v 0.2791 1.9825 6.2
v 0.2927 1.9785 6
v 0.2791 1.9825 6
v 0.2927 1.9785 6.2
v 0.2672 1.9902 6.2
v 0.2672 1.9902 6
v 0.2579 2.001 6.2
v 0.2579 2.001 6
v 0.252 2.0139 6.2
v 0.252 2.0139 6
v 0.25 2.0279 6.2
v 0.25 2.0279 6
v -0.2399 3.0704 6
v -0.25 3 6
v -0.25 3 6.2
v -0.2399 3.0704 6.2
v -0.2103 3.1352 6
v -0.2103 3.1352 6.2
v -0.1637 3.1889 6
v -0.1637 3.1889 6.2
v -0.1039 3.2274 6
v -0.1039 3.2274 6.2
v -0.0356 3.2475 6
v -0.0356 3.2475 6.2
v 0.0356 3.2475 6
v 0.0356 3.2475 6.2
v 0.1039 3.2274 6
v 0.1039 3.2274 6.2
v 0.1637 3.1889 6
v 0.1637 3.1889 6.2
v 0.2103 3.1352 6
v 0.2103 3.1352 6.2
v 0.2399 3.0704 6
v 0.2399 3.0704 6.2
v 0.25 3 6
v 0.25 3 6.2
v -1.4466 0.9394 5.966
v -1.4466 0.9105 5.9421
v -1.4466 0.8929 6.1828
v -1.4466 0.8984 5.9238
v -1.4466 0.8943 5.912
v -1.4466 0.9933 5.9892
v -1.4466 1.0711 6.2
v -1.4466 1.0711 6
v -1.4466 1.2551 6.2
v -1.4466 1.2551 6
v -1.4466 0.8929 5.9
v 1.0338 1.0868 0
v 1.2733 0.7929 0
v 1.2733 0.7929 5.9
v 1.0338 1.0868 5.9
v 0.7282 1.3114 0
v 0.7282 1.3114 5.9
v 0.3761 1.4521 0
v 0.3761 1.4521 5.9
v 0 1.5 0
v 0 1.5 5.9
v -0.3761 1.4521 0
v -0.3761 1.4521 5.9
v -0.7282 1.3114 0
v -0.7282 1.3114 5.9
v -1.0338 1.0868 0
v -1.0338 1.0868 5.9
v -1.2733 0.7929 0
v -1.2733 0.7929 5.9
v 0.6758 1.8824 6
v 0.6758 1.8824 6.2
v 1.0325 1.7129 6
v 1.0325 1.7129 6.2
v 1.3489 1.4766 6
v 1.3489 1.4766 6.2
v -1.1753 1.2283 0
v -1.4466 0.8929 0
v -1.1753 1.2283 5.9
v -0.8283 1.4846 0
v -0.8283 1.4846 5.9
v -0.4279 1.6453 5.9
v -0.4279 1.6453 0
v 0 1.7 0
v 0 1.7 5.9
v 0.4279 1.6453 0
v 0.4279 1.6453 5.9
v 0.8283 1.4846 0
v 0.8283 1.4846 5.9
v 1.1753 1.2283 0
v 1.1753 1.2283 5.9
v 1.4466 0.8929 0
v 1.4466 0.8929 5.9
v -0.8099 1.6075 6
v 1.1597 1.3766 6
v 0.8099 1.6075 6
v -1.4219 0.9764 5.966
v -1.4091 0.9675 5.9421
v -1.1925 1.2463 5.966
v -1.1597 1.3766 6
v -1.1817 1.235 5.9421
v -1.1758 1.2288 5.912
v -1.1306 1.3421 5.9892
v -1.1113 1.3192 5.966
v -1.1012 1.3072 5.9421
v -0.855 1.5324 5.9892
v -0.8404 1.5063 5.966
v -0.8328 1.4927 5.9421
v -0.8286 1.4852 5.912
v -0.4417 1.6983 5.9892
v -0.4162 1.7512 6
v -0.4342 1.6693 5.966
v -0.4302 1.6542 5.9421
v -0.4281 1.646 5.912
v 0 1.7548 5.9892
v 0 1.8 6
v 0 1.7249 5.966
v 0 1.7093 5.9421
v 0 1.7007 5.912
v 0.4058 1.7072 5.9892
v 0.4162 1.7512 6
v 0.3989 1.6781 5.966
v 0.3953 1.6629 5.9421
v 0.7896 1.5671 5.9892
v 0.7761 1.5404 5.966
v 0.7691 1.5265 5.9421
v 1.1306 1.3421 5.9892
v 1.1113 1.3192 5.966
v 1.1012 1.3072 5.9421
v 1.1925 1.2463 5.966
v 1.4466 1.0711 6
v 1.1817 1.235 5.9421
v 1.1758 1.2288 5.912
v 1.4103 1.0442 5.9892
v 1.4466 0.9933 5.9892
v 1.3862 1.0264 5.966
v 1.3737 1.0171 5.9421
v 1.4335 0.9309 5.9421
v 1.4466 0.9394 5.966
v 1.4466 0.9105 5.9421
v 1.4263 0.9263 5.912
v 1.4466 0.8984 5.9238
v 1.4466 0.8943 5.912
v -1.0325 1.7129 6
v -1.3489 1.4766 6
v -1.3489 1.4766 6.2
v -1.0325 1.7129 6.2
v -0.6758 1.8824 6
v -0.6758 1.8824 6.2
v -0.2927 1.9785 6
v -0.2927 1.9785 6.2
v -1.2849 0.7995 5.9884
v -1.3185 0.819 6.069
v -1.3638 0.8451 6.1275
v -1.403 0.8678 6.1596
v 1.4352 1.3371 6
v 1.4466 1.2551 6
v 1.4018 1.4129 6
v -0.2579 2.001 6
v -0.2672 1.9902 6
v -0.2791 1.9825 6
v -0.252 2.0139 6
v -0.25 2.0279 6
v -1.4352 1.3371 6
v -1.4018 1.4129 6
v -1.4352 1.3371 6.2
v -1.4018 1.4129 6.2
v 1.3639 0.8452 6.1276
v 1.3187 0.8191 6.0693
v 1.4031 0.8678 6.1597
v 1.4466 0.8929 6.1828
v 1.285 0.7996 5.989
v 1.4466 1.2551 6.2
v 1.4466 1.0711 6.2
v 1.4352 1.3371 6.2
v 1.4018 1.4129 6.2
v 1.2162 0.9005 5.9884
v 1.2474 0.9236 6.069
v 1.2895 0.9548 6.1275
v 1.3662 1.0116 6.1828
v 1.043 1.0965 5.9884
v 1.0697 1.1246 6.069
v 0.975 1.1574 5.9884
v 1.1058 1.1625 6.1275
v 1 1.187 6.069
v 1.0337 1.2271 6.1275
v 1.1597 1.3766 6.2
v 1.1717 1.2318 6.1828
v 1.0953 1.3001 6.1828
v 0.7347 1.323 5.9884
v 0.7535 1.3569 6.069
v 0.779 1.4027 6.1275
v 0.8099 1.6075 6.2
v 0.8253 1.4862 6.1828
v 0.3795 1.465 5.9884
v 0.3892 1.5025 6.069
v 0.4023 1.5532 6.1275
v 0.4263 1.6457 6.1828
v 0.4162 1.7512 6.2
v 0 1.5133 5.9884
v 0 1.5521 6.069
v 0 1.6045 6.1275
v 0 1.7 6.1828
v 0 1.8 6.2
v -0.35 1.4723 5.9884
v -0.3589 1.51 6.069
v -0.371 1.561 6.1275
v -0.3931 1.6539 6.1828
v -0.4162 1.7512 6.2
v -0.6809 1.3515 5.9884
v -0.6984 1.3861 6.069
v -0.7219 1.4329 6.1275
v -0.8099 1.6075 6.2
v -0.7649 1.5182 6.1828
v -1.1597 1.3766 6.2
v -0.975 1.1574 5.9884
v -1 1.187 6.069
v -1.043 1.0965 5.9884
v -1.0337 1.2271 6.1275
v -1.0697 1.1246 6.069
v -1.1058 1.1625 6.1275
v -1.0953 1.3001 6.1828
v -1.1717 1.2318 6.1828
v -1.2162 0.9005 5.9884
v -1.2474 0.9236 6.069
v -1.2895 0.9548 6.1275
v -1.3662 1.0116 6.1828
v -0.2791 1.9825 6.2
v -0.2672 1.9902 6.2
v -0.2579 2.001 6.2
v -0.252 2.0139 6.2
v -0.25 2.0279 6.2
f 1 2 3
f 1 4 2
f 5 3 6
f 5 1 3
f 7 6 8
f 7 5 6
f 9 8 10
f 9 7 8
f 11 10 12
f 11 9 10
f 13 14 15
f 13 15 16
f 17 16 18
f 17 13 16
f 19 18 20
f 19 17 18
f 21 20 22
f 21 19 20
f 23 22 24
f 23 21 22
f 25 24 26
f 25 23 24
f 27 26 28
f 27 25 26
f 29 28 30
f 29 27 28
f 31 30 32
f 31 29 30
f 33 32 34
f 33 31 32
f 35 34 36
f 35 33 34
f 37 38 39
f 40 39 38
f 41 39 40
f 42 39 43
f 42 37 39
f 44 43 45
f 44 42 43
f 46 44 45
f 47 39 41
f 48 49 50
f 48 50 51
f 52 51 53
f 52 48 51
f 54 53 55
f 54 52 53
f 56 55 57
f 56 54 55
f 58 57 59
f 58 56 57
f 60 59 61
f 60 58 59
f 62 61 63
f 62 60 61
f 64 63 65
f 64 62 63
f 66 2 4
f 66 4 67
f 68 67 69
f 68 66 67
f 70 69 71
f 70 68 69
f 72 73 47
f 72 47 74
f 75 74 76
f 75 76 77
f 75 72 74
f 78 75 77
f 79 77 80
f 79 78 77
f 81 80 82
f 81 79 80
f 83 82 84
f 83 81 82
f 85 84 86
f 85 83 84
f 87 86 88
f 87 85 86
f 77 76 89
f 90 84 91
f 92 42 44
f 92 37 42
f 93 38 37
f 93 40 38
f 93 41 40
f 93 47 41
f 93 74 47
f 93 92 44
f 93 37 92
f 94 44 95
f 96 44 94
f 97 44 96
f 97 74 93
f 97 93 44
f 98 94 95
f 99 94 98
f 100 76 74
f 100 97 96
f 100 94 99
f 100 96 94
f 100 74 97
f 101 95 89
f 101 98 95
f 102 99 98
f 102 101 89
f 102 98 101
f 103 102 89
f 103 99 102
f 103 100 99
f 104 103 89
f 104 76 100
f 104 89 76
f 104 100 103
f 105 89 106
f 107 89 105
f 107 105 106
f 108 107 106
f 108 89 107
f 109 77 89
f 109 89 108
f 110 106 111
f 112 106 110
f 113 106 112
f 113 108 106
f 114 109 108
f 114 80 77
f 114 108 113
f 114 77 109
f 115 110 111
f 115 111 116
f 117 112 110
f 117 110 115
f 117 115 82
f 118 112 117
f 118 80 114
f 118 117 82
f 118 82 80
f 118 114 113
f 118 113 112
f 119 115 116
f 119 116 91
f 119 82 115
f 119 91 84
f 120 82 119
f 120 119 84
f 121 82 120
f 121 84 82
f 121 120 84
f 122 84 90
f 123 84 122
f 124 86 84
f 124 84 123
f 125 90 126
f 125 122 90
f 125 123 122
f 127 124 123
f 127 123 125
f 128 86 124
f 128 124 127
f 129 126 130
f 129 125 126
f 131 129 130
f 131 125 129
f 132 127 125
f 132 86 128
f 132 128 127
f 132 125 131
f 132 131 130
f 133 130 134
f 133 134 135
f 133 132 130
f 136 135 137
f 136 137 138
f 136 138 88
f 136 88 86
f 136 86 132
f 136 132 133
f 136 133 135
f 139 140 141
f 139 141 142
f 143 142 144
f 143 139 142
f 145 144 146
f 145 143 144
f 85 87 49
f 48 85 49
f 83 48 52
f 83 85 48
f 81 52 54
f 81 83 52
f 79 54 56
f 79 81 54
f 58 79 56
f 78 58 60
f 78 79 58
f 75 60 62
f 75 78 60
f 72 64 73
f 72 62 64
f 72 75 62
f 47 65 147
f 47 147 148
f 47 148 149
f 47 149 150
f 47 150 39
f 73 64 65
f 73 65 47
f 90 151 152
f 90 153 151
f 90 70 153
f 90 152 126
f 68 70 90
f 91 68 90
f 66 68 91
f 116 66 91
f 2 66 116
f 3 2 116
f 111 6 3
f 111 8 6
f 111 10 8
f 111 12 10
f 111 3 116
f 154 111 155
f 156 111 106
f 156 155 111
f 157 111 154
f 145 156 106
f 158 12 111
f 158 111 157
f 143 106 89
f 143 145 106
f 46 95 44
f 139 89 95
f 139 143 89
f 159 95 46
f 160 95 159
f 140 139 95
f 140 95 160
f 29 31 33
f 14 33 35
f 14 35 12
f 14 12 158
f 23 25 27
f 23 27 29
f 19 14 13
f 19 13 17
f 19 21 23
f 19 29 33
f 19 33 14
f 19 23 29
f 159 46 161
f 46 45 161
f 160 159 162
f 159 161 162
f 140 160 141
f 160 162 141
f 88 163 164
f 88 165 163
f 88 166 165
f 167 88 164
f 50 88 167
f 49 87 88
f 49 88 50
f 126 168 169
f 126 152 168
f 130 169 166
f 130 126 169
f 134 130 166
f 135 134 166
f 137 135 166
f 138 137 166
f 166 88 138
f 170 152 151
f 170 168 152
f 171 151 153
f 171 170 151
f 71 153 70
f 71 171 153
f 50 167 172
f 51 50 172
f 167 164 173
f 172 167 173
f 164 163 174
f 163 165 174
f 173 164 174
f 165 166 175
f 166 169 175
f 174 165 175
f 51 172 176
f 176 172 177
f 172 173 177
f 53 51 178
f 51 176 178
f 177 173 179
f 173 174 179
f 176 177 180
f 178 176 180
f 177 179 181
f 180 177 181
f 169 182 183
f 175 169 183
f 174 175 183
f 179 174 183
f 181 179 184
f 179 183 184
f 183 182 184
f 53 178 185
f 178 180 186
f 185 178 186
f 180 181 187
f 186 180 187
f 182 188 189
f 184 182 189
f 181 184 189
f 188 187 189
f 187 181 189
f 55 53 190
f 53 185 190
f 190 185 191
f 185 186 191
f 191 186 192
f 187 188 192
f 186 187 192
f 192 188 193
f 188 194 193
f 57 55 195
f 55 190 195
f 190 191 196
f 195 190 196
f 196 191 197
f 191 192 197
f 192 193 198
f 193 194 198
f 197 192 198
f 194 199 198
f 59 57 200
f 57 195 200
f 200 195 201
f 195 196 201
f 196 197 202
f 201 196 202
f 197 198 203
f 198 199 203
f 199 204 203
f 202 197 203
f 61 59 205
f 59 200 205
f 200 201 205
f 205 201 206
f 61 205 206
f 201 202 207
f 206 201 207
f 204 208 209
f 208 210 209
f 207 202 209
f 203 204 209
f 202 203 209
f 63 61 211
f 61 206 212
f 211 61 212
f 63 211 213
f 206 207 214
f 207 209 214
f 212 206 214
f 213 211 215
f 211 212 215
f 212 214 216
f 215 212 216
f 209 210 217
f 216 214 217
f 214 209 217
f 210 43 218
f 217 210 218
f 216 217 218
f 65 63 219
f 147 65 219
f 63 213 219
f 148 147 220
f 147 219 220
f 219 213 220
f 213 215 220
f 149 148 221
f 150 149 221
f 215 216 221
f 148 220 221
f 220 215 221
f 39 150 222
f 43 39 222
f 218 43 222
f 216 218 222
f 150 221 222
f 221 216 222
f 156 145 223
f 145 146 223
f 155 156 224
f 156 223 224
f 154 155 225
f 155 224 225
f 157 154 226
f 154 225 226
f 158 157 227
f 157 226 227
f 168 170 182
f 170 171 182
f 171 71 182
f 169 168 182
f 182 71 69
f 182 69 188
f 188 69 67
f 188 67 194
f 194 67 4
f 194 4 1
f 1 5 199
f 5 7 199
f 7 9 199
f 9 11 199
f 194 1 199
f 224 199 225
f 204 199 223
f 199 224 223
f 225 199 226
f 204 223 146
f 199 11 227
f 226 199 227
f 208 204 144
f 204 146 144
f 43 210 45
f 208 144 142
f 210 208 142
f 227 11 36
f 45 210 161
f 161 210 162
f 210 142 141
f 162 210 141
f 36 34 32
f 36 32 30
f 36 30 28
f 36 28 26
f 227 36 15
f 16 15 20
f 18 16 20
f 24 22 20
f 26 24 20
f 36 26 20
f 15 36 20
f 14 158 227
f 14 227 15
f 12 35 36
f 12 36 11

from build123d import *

# Parameters (mm, degrees)
EXTRUDE_6_DEPTH = 6
EXTRUDE_7_DEPTH = 0.2
EXTRUDE_START   = -0.2
EXTRUDE_8_DEPTH = 0.2
FILLET_4_R      = 0.05
FILLET_5_R      = 0.1
FILLET_6_R      = 0.3
FILLET_7_R      = 0.3


with BuildPart() as part:
    # Эскиз1 → Бобышка-Вытянуть6 (new body)
    with BuildSketch(Plane.XY):
        with BuildLine():
            Line((-1.273316217, 0.792884488), (-1.446606265, 0.892933544))
            ThreePointArc((-1.446606265, 0.892933544), (0, 1.7), (1.446606265, 0.892933544))
            Line((1.446606265, 0.892933544), (1.273316217, 0.792884488))
            ThreePointArc((1.273316217, 0.792884488), (0, 1.5), (-1.273316217, 0.792884488))
        make_face()
    extrude(amount=EXTRUDE_6_DEPTH)

    # Эскиз8 → Бобышка-Вытянуть7 (add)
    with BuildSketch(Plane.XY.offset(6)):
        with BuildLine():
            Line((-1.273316217, 0.792884488), (-1.446606265, 0.892933544))
            Line((-1.446606265, 0.892933544), (-1.446606265, 1.3810613))
            ThreePointArc((-1.446606265, 1.3810613), (0, 2), (1.446606265, 1.3810613))
            Line((1.446606265, 1.3810613), (1.446606265, 0.892933544))
            Line((1.446606265, 0.892933544), (1.273316217, 0.792884488))
            ThreePointArc((1.273316217, 0.792884488), (0, 1.5), (-1.273316217, 0.792884488))
        make_face()
    extrude(amount=EXTRUDE_7_DEPTH)

    # Эскиз9 → Бобышка-Вытянуть8 (add)
    with BuildSketch(Plane.XY.offset(6.2).offset(EXTRUDE_START)):
        with BuildLine():
            Line((-0.25, 1.984313483), (-0.25, 3))
            ThreePointArc((-0.25, 3), (0, 3.25), (0.25, 3))
            Line((0.25, 3), (0.25, 1.984313483))
            ThreePointArc((0.25, 1.984313483), (0, 2), (-0.25, 1.984313483))
        make_face()
    extrude(amount=EXTRUDE_8_DEPTH)

    # Скругление4
    fillet_4_edges = [part.edges().sort_by_distance(p)[0] for p in [
        (0.25, 1.984313483, 6.1),
        (-0.25, 1.984313483, 6.1),
    ]]
    fillet(fillet_4_edges, radius=FILLET_4_R)

    # Скругление5
    fillet_5_edges = [part.edges().sort_by_distance(p)[0] for p in [
        (0, 1.7, 6),
    ]]
    fillet(fillet_5_edges, radius=FILLET_5_R)

    # Скругление6
    fillet_6_edges = [part.edges().sort_by_distance(p)[0] for p in [
        (0, 1.5, 6.2),
    ]]
    fillet(fillet_6_edges, radius=FILLET_6_R)

    # Скругление7
    fillet_7_edges = [part.edges().sort_by_distance(p)[0] for p in [
        (1.446606265, 1.3810613, 6.1),
        (-1.446606265, 1.3810613, 6.1),
    ]]
    fillet(fillet_7_edges, radius=FILLET_7_R)


solid = part.part
